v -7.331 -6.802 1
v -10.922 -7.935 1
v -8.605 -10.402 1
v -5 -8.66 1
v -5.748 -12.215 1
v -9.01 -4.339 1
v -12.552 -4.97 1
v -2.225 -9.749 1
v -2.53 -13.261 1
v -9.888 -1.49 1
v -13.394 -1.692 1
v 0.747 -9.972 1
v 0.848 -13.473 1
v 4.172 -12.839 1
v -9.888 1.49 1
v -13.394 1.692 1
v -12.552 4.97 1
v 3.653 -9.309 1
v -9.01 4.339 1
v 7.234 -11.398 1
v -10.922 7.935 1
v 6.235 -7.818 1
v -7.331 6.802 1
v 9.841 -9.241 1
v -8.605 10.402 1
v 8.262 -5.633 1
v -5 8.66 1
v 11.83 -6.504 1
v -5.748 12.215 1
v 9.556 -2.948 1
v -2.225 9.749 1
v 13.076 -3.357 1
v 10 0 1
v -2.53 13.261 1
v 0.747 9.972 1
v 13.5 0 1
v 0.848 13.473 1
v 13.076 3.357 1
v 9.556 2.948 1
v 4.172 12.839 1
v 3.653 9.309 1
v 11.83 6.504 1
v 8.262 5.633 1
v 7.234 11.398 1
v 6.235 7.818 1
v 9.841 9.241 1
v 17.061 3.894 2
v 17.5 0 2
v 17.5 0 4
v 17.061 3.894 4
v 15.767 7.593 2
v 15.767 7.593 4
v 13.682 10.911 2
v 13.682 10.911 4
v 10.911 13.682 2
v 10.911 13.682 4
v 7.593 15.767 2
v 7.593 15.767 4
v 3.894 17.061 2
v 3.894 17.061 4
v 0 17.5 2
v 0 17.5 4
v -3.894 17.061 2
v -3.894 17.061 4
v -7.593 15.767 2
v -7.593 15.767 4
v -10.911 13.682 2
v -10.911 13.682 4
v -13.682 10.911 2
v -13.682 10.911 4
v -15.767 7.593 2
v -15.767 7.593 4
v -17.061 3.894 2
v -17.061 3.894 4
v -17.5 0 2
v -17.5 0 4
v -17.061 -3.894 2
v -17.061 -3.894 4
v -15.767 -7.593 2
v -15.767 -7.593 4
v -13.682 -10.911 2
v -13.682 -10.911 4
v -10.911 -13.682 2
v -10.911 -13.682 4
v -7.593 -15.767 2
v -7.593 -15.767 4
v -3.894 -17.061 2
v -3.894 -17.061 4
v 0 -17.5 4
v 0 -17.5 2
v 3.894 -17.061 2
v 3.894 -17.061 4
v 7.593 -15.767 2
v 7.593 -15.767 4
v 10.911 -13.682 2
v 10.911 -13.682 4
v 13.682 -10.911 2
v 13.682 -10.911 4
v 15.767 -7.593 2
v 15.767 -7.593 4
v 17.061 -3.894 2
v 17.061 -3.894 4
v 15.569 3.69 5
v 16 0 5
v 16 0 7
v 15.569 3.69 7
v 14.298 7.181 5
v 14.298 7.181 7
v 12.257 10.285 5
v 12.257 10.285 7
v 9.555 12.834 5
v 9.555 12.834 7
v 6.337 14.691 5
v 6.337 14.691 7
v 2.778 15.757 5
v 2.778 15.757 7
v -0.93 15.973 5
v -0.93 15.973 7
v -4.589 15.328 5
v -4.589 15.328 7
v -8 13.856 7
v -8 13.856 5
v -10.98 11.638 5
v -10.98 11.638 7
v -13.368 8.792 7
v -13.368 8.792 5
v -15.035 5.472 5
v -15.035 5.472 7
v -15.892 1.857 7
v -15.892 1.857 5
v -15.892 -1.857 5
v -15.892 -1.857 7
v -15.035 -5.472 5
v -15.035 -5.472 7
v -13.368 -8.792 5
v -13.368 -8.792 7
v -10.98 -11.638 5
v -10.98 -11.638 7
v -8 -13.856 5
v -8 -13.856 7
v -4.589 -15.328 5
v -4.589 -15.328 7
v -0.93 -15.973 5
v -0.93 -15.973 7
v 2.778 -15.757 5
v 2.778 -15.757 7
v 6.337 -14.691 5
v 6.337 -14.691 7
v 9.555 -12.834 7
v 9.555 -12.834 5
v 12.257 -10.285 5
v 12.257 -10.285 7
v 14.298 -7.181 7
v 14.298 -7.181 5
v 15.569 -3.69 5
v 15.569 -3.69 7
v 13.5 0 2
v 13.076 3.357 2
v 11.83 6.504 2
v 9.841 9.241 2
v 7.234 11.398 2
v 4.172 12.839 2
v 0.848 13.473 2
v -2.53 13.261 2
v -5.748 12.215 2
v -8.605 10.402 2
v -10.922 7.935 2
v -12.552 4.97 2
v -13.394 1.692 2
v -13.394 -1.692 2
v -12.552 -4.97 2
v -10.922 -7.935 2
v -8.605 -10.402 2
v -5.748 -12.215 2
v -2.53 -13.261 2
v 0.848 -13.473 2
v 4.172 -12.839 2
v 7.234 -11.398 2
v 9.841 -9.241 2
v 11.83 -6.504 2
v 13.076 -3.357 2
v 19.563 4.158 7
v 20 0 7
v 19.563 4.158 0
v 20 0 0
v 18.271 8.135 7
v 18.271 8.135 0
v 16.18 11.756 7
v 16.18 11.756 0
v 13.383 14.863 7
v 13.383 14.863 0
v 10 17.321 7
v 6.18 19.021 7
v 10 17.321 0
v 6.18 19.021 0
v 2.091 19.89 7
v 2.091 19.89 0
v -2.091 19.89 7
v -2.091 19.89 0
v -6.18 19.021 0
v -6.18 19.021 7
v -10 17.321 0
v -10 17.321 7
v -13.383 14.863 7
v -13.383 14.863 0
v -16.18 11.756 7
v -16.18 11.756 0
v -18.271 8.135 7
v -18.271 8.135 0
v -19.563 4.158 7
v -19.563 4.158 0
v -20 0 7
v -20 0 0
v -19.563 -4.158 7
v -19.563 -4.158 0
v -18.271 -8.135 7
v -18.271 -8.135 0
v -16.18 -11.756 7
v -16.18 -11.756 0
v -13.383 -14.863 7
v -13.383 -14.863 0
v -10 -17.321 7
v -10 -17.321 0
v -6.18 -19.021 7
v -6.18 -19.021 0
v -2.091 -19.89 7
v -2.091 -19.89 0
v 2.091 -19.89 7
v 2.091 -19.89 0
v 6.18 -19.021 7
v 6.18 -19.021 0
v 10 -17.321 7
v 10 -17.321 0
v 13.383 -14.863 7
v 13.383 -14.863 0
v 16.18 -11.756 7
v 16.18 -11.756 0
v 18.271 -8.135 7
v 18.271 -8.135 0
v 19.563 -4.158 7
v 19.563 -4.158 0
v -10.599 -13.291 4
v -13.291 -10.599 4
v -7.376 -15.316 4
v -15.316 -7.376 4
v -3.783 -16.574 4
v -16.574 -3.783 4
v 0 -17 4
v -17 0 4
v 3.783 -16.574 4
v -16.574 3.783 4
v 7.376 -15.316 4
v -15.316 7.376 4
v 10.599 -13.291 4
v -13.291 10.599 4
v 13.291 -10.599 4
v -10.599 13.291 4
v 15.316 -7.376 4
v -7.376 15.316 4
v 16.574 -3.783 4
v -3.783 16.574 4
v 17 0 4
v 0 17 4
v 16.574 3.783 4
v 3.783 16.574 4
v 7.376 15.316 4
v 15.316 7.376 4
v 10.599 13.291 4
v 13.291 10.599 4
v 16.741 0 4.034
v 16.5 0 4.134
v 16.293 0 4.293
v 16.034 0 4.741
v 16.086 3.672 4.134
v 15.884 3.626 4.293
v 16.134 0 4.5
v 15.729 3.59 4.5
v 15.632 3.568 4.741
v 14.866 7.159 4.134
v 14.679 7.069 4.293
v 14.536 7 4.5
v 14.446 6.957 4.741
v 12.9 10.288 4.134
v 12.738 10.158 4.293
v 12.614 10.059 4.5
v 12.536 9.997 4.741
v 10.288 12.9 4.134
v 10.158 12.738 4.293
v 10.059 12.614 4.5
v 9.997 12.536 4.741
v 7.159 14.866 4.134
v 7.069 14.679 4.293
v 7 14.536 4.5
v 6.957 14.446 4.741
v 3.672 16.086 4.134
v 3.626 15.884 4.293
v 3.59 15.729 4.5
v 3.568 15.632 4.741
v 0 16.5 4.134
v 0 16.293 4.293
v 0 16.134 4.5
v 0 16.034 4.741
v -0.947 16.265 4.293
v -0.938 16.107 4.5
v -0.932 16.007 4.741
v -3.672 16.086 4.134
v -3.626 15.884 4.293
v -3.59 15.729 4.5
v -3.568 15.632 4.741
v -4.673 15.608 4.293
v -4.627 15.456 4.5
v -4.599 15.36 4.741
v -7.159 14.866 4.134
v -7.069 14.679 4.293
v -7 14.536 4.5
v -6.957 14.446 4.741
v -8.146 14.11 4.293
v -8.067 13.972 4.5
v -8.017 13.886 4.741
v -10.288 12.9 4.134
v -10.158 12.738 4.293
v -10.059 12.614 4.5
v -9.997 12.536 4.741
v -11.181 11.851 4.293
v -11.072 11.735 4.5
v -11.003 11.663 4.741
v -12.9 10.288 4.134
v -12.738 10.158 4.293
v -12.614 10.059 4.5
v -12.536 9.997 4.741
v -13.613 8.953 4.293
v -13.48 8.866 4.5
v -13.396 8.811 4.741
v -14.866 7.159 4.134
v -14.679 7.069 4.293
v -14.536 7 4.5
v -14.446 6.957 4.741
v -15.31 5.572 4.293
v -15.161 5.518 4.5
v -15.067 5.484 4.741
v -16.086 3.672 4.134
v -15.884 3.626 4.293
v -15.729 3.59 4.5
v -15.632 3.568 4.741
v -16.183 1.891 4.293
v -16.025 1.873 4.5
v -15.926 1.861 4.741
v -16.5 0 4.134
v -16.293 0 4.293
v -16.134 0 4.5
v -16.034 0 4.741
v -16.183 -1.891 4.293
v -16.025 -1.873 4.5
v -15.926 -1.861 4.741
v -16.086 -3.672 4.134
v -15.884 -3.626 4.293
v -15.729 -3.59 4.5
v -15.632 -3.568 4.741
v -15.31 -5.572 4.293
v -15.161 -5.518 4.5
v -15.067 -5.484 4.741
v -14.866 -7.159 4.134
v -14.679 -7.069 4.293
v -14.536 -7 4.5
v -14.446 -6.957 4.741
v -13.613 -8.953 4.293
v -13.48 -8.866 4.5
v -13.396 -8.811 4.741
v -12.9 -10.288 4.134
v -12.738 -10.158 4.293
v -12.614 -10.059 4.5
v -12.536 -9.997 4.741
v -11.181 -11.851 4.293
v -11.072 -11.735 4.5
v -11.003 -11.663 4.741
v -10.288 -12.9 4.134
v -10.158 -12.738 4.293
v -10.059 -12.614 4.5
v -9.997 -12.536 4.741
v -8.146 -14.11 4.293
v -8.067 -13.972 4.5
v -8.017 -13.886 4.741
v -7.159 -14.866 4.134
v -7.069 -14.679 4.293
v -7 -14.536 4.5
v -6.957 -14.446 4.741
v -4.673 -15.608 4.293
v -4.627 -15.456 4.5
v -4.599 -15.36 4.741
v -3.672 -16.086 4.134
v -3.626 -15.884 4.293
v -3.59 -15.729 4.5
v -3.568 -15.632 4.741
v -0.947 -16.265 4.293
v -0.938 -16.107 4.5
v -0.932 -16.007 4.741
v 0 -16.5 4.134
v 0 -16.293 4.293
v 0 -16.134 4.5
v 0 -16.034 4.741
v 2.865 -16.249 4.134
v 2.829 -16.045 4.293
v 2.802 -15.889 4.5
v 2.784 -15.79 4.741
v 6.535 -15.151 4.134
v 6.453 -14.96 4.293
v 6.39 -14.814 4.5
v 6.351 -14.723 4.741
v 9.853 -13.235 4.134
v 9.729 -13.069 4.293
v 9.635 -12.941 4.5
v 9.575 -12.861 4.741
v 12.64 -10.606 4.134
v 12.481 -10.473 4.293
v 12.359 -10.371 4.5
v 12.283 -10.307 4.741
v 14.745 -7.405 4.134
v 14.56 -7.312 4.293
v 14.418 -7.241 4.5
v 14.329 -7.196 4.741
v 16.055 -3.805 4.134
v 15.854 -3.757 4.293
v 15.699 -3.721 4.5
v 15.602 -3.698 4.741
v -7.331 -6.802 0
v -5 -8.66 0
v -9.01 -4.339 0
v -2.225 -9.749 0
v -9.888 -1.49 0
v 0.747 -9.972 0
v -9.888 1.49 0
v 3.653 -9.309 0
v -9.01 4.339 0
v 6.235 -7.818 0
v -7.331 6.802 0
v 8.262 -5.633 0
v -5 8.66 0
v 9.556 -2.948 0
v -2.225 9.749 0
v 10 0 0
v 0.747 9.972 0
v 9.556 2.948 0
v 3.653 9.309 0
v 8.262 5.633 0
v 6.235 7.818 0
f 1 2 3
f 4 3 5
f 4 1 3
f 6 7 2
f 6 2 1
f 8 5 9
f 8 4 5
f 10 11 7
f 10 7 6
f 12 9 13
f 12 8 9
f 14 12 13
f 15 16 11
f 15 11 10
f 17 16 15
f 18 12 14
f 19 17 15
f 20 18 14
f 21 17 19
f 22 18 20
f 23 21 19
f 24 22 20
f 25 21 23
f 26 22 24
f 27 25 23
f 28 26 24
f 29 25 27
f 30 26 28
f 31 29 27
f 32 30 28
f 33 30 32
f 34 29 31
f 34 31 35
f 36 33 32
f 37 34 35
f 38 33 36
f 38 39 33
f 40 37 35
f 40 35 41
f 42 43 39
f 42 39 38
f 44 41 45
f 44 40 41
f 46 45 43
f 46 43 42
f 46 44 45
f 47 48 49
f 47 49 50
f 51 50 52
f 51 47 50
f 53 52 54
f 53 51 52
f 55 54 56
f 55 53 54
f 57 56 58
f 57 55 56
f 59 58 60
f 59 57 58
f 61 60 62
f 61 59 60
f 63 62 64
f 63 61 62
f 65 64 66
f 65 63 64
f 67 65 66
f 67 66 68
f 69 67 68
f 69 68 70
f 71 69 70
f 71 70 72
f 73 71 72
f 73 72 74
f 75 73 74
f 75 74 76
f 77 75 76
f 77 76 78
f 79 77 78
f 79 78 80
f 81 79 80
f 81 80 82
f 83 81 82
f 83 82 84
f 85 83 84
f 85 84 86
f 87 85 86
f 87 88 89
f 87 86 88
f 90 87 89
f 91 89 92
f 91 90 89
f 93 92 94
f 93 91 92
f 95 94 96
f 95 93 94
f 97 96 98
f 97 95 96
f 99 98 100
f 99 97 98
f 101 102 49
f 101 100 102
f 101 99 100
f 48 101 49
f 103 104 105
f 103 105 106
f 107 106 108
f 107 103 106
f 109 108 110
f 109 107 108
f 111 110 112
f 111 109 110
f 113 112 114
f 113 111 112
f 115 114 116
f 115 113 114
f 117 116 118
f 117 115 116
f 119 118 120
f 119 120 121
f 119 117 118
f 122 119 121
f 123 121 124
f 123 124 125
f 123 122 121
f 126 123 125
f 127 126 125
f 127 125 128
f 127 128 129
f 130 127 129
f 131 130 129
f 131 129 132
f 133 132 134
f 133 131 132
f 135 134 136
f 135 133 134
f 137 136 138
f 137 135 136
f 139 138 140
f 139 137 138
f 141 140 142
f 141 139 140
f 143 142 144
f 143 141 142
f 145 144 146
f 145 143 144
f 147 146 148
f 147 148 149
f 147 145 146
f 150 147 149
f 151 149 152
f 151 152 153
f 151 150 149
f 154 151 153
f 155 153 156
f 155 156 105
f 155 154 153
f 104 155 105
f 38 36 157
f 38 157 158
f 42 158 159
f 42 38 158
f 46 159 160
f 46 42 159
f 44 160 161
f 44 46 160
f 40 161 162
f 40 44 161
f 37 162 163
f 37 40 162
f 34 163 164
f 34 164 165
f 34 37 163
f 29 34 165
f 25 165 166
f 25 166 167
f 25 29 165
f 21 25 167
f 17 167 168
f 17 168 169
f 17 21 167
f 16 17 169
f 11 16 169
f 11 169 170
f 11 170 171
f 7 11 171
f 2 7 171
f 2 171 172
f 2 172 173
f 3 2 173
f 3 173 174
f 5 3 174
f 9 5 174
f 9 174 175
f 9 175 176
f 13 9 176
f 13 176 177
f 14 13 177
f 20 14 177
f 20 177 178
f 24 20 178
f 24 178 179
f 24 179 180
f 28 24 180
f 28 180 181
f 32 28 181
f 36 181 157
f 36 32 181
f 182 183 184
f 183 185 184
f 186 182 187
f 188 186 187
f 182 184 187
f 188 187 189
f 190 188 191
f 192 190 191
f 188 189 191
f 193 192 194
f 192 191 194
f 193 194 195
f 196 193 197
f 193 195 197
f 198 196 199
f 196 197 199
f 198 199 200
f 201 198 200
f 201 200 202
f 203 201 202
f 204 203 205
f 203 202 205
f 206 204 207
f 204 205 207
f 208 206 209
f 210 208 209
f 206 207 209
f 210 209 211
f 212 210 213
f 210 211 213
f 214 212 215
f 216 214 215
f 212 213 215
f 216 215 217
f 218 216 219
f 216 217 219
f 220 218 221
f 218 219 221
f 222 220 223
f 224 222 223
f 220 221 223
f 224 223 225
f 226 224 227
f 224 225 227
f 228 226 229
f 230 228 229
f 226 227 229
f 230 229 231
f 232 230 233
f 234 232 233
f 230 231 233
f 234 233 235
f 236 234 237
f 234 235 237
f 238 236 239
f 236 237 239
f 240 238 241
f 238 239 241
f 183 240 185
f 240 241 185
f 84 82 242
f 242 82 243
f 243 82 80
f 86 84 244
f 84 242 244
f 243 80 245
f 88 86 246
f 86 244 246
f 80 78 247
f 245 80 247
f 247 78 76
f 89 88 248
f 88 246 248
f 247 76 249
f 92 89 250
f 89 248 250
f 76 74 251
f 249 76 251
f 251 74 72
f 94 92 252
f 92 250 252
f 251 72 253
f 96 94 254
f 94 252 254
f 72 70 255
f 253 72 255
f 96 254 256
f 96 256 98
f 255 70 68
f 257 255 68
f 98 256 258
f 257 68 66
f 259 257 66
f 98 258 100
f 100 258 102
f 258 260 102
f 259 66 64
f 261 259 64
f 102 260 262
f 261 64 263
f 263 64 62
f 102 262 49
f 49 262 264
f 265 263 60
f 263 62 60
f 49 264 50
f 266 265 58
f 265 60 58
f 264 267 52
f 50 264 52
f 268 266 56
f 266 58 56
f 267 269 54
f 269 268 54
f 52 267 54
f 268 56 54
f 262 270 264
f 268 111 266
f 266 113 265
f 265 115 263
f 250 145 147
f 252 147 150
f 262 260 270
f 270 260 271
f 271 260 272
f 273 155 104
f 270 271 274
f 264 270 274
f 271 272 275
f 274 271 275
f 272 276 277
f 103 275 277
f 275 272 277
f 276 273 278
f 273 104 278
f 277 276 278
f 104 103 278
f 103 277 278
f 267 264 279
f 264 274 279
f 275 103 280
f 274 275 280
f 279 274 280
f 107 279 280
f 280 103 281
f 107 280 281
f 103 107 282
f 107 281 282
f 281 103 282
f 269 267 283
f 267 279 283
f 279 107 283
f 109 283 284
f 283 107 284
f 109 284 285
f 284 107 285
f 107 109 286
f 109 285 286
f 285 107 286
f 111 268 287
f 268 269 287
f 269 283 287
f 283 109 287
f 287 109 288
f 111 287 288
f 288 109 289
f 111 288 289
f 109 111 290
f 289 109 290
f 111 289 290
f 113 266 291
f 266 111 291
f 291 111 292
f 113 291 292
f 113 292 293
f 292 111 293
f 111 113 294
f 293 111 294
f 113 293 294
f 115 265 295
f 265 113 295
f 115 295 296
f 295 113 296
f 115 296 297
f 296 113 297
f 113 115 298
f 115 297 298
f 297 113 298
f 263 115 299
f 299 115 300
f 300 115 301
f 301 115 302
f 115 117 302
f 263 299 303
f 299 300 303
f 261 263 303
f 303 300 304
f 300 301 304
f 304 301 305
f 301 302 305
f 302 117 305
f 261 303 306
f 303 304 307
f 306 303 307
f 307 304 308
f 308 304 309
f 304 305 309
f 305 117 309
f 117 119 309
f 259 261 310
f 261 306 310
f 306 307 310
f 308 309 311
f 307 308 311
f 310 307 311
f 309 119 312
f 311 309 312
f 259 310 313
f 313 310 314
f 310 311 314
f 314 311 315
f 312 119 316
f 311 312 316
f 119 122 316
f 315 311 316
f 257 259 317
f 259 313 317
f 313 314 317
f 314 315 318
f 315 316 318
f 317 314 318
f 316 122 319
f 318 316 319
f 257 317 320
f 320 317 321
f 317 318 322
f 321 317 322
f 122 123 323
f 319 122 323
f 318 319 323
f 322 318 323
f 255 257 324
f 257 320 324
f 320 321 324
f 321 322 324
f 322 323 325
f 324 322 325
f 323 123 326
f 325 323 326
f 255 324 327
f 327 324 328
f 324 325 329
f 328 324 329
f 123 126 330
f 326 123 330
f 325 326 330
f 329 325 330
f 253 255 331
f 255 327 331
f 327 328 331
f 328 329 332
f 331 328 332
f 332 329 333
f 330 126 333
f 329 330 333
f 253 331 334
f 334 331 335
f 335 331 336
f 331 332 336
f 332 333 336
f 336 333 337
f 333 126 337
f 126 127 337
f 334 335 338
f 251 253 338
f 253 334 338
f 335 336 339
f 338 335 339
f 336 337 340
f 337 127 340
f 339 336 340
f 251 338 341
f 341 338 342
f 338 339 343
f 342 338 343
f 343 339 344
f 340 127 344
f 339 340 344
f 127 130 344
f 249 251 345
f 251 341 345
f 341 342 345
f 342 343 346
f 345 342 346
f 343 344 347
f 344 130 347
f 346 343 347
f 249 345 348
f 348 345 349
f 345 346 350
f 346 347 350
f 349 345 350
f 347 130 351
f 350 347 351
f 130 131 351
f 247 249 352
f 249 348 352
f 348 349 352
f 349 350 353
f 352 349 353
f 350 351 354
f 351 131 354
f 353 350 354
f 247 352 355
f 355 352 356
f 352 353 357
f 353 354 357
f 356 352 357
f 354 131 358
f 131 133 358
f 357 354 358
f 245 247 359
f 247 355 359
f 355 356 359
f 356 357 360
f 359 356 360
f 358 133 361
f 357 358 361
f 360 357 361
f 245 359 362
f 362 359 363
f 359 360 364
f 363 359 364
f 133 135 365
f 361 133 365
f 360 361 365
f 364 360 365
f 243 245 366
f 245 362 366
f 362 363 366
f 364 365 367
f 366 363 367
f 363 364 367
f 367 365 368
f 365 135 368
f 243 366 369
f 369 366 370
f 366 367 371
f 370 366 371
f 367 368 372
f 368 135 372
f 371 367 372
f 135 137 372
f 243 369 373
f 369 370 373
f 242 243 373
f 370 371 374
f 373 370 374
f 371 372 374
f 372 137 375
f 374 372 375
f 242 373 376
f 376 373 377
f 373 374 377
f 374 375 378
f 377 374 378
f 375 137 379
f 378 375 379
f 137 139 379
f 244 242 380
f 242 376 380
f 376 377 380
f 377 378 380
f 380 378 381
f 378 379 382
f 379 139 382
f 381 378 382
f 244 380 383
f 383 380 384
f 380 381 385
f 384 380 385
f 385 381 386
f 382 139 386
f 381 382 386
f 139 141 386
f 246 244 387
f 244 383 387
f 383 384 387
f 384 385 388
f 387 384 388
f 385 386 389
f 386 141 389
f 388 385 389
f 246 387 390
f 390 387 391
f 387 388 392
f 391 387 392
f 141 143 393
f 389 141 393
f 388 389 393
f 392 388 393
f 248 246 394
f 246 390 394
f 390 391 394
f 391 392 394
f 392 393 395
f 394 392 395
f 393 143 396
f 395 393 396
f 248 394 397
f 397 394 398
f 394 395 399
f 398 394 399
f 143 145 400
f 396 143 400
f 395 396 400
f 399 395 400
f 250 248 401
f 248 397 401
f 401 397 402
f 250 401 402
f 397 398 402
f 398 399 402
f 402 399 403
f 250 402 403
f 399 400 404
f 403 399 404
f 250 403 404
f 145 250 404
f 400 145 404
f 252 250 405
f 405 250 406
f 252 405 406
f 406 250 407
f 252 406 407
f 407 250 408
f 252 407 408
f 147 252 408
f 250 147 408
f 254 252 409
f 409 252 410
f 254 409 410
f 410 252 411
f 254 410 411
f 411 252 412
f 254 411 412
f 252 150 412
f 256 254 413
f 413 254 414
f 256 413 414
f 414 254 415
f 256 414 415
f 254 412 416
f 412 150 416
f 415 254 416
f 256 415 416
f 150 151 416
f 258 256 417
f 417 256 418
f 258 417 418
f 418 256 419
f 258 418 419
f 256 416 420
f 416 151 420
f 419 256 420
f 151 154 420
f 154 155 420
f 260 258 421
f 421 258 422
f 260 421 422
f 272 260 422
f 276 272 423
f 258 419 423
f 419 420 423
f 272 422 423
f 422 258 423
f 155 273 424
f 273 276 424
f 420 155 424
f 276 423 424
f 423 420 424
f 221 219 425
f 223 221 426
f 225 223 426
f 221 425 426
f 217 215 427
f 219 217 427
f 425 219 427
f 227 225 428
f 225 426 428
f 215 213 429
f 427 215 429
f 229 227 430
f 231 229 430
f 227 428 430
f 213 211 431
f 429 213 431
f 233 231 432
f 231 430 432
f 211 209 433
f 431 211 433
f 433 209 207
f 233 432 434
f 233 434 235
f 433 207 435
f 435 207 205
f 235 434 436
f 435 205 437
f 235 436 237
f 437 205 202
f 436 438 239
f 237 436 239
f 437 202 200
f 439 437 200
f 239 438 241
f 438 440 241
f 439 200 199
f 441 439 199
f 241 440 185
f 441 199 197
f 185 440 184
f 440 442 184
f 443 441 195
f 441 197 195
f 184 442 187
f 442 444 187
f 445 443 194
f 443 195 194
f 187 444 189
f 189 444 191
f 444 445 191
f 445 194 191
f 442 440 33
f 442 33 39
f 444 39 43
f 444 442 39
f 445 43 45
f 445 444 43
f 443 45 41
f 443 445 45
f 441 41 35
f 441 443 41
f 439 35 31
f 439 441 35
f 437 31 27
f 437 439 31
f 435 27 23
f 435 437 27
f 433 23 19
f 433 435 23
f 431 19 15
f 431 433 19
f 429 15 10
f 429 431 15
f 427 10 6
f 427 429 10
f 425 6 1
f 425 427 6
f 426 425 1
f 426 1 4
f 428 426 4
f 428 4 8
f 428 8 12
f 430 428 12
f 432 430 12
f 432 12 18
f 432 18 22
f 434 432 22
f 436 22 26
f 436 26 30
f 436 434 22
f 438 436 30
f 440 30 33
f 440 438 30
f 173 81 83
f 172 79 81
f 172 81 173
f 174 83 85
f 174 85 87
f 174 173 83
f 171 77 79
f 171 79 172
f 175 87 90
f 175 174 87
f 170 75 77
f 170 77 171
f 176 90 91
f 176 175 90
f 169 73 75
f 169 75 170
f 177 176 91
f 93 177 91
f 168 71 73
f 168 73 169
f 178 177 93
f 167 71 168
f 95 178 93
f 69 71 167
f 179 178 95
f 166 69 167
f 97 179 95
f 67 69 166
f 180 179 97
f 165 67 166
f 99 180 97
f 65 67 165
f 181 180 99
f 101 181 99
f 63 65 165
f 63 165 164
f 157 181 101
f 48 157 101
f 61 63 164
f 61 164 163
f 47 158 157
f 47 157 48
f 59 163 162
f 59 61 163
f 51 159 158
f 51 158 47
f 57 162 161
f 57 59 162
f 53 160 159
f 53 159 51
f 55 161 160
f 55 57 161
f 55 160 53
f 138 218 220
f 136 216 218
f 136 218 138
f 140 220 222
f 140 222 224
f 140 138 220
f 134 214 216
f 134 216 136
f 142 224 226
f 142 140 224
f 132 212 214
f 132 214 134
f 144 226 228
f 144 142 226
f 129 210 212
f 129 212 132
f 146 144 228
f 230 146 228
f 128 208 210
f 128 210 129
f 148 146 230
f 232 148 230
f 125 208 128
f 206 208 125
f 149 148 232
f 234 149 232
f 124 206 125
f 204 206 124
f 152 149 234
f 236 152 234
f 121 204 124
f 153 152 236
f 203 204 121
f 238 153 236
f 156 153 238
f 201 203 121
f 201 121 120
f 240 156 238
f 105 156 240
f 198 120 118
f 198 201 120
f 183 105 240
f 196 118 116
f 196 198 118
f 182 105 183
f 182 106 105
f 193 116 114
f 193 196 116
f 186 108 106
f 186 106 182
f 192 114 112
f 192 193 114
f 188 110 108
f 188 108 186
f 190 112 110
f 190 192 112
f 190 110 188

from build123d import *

# Parameters (mm, degrees)
F0_R     = 13.5
F0_R_2   = 10
F1_DEPTH = 1
F0_R_3   = 17.5
F2_DEPTH = 2
F0_R_4   = 20
F3_DEPTH = 7
F5_START = 4
F4_R     = 20
F4_R_2   = 16
F5_DEPTH = 3
F6_R     = 1


with BuildPart() as f1:
    # F0 (on Top) → F1 (new body)
    with BuildSketch(Plane.XY):
        Circle(F0_R)
        Circle(F0_R_2, mode=Mode.SUBTRACT)
    extrude(amount=F1_DEPTH)

    # F0 (on Top) → F2 (join)
    with BuildSketch(Plane.XY):
        Circle(F0_R_3)
        Circle(F0_R, mode=Mode.SUBTRACT)
    extrude(amount=F2_DEPTH)

    # F0 (on Top) → F3 (join)
    with BuildSketch(Plane.XY):
        Circle(F0_R_4)
        Circle(F0_R_3, mode=Mode.SUBTRACT)
    extrude(amount=F3_DEPTH)

    # F4 (on Top) → F5 (join)
    with BuildSketch(Plane.XY.offset(F5_START)):
        Circle(F4_R)
        Circle(F4_R_2, mode=Mode.SUBTRACT)
    extrude(amount=F5_DEPTH)

    # F6
    f6_edges = [f1.edges().sort_by_distance(p)[0] for p in [
        (-16, 0, 4),
    ]]
    fillet(f6_edges, radius=F6_R)


solid = f1.part
